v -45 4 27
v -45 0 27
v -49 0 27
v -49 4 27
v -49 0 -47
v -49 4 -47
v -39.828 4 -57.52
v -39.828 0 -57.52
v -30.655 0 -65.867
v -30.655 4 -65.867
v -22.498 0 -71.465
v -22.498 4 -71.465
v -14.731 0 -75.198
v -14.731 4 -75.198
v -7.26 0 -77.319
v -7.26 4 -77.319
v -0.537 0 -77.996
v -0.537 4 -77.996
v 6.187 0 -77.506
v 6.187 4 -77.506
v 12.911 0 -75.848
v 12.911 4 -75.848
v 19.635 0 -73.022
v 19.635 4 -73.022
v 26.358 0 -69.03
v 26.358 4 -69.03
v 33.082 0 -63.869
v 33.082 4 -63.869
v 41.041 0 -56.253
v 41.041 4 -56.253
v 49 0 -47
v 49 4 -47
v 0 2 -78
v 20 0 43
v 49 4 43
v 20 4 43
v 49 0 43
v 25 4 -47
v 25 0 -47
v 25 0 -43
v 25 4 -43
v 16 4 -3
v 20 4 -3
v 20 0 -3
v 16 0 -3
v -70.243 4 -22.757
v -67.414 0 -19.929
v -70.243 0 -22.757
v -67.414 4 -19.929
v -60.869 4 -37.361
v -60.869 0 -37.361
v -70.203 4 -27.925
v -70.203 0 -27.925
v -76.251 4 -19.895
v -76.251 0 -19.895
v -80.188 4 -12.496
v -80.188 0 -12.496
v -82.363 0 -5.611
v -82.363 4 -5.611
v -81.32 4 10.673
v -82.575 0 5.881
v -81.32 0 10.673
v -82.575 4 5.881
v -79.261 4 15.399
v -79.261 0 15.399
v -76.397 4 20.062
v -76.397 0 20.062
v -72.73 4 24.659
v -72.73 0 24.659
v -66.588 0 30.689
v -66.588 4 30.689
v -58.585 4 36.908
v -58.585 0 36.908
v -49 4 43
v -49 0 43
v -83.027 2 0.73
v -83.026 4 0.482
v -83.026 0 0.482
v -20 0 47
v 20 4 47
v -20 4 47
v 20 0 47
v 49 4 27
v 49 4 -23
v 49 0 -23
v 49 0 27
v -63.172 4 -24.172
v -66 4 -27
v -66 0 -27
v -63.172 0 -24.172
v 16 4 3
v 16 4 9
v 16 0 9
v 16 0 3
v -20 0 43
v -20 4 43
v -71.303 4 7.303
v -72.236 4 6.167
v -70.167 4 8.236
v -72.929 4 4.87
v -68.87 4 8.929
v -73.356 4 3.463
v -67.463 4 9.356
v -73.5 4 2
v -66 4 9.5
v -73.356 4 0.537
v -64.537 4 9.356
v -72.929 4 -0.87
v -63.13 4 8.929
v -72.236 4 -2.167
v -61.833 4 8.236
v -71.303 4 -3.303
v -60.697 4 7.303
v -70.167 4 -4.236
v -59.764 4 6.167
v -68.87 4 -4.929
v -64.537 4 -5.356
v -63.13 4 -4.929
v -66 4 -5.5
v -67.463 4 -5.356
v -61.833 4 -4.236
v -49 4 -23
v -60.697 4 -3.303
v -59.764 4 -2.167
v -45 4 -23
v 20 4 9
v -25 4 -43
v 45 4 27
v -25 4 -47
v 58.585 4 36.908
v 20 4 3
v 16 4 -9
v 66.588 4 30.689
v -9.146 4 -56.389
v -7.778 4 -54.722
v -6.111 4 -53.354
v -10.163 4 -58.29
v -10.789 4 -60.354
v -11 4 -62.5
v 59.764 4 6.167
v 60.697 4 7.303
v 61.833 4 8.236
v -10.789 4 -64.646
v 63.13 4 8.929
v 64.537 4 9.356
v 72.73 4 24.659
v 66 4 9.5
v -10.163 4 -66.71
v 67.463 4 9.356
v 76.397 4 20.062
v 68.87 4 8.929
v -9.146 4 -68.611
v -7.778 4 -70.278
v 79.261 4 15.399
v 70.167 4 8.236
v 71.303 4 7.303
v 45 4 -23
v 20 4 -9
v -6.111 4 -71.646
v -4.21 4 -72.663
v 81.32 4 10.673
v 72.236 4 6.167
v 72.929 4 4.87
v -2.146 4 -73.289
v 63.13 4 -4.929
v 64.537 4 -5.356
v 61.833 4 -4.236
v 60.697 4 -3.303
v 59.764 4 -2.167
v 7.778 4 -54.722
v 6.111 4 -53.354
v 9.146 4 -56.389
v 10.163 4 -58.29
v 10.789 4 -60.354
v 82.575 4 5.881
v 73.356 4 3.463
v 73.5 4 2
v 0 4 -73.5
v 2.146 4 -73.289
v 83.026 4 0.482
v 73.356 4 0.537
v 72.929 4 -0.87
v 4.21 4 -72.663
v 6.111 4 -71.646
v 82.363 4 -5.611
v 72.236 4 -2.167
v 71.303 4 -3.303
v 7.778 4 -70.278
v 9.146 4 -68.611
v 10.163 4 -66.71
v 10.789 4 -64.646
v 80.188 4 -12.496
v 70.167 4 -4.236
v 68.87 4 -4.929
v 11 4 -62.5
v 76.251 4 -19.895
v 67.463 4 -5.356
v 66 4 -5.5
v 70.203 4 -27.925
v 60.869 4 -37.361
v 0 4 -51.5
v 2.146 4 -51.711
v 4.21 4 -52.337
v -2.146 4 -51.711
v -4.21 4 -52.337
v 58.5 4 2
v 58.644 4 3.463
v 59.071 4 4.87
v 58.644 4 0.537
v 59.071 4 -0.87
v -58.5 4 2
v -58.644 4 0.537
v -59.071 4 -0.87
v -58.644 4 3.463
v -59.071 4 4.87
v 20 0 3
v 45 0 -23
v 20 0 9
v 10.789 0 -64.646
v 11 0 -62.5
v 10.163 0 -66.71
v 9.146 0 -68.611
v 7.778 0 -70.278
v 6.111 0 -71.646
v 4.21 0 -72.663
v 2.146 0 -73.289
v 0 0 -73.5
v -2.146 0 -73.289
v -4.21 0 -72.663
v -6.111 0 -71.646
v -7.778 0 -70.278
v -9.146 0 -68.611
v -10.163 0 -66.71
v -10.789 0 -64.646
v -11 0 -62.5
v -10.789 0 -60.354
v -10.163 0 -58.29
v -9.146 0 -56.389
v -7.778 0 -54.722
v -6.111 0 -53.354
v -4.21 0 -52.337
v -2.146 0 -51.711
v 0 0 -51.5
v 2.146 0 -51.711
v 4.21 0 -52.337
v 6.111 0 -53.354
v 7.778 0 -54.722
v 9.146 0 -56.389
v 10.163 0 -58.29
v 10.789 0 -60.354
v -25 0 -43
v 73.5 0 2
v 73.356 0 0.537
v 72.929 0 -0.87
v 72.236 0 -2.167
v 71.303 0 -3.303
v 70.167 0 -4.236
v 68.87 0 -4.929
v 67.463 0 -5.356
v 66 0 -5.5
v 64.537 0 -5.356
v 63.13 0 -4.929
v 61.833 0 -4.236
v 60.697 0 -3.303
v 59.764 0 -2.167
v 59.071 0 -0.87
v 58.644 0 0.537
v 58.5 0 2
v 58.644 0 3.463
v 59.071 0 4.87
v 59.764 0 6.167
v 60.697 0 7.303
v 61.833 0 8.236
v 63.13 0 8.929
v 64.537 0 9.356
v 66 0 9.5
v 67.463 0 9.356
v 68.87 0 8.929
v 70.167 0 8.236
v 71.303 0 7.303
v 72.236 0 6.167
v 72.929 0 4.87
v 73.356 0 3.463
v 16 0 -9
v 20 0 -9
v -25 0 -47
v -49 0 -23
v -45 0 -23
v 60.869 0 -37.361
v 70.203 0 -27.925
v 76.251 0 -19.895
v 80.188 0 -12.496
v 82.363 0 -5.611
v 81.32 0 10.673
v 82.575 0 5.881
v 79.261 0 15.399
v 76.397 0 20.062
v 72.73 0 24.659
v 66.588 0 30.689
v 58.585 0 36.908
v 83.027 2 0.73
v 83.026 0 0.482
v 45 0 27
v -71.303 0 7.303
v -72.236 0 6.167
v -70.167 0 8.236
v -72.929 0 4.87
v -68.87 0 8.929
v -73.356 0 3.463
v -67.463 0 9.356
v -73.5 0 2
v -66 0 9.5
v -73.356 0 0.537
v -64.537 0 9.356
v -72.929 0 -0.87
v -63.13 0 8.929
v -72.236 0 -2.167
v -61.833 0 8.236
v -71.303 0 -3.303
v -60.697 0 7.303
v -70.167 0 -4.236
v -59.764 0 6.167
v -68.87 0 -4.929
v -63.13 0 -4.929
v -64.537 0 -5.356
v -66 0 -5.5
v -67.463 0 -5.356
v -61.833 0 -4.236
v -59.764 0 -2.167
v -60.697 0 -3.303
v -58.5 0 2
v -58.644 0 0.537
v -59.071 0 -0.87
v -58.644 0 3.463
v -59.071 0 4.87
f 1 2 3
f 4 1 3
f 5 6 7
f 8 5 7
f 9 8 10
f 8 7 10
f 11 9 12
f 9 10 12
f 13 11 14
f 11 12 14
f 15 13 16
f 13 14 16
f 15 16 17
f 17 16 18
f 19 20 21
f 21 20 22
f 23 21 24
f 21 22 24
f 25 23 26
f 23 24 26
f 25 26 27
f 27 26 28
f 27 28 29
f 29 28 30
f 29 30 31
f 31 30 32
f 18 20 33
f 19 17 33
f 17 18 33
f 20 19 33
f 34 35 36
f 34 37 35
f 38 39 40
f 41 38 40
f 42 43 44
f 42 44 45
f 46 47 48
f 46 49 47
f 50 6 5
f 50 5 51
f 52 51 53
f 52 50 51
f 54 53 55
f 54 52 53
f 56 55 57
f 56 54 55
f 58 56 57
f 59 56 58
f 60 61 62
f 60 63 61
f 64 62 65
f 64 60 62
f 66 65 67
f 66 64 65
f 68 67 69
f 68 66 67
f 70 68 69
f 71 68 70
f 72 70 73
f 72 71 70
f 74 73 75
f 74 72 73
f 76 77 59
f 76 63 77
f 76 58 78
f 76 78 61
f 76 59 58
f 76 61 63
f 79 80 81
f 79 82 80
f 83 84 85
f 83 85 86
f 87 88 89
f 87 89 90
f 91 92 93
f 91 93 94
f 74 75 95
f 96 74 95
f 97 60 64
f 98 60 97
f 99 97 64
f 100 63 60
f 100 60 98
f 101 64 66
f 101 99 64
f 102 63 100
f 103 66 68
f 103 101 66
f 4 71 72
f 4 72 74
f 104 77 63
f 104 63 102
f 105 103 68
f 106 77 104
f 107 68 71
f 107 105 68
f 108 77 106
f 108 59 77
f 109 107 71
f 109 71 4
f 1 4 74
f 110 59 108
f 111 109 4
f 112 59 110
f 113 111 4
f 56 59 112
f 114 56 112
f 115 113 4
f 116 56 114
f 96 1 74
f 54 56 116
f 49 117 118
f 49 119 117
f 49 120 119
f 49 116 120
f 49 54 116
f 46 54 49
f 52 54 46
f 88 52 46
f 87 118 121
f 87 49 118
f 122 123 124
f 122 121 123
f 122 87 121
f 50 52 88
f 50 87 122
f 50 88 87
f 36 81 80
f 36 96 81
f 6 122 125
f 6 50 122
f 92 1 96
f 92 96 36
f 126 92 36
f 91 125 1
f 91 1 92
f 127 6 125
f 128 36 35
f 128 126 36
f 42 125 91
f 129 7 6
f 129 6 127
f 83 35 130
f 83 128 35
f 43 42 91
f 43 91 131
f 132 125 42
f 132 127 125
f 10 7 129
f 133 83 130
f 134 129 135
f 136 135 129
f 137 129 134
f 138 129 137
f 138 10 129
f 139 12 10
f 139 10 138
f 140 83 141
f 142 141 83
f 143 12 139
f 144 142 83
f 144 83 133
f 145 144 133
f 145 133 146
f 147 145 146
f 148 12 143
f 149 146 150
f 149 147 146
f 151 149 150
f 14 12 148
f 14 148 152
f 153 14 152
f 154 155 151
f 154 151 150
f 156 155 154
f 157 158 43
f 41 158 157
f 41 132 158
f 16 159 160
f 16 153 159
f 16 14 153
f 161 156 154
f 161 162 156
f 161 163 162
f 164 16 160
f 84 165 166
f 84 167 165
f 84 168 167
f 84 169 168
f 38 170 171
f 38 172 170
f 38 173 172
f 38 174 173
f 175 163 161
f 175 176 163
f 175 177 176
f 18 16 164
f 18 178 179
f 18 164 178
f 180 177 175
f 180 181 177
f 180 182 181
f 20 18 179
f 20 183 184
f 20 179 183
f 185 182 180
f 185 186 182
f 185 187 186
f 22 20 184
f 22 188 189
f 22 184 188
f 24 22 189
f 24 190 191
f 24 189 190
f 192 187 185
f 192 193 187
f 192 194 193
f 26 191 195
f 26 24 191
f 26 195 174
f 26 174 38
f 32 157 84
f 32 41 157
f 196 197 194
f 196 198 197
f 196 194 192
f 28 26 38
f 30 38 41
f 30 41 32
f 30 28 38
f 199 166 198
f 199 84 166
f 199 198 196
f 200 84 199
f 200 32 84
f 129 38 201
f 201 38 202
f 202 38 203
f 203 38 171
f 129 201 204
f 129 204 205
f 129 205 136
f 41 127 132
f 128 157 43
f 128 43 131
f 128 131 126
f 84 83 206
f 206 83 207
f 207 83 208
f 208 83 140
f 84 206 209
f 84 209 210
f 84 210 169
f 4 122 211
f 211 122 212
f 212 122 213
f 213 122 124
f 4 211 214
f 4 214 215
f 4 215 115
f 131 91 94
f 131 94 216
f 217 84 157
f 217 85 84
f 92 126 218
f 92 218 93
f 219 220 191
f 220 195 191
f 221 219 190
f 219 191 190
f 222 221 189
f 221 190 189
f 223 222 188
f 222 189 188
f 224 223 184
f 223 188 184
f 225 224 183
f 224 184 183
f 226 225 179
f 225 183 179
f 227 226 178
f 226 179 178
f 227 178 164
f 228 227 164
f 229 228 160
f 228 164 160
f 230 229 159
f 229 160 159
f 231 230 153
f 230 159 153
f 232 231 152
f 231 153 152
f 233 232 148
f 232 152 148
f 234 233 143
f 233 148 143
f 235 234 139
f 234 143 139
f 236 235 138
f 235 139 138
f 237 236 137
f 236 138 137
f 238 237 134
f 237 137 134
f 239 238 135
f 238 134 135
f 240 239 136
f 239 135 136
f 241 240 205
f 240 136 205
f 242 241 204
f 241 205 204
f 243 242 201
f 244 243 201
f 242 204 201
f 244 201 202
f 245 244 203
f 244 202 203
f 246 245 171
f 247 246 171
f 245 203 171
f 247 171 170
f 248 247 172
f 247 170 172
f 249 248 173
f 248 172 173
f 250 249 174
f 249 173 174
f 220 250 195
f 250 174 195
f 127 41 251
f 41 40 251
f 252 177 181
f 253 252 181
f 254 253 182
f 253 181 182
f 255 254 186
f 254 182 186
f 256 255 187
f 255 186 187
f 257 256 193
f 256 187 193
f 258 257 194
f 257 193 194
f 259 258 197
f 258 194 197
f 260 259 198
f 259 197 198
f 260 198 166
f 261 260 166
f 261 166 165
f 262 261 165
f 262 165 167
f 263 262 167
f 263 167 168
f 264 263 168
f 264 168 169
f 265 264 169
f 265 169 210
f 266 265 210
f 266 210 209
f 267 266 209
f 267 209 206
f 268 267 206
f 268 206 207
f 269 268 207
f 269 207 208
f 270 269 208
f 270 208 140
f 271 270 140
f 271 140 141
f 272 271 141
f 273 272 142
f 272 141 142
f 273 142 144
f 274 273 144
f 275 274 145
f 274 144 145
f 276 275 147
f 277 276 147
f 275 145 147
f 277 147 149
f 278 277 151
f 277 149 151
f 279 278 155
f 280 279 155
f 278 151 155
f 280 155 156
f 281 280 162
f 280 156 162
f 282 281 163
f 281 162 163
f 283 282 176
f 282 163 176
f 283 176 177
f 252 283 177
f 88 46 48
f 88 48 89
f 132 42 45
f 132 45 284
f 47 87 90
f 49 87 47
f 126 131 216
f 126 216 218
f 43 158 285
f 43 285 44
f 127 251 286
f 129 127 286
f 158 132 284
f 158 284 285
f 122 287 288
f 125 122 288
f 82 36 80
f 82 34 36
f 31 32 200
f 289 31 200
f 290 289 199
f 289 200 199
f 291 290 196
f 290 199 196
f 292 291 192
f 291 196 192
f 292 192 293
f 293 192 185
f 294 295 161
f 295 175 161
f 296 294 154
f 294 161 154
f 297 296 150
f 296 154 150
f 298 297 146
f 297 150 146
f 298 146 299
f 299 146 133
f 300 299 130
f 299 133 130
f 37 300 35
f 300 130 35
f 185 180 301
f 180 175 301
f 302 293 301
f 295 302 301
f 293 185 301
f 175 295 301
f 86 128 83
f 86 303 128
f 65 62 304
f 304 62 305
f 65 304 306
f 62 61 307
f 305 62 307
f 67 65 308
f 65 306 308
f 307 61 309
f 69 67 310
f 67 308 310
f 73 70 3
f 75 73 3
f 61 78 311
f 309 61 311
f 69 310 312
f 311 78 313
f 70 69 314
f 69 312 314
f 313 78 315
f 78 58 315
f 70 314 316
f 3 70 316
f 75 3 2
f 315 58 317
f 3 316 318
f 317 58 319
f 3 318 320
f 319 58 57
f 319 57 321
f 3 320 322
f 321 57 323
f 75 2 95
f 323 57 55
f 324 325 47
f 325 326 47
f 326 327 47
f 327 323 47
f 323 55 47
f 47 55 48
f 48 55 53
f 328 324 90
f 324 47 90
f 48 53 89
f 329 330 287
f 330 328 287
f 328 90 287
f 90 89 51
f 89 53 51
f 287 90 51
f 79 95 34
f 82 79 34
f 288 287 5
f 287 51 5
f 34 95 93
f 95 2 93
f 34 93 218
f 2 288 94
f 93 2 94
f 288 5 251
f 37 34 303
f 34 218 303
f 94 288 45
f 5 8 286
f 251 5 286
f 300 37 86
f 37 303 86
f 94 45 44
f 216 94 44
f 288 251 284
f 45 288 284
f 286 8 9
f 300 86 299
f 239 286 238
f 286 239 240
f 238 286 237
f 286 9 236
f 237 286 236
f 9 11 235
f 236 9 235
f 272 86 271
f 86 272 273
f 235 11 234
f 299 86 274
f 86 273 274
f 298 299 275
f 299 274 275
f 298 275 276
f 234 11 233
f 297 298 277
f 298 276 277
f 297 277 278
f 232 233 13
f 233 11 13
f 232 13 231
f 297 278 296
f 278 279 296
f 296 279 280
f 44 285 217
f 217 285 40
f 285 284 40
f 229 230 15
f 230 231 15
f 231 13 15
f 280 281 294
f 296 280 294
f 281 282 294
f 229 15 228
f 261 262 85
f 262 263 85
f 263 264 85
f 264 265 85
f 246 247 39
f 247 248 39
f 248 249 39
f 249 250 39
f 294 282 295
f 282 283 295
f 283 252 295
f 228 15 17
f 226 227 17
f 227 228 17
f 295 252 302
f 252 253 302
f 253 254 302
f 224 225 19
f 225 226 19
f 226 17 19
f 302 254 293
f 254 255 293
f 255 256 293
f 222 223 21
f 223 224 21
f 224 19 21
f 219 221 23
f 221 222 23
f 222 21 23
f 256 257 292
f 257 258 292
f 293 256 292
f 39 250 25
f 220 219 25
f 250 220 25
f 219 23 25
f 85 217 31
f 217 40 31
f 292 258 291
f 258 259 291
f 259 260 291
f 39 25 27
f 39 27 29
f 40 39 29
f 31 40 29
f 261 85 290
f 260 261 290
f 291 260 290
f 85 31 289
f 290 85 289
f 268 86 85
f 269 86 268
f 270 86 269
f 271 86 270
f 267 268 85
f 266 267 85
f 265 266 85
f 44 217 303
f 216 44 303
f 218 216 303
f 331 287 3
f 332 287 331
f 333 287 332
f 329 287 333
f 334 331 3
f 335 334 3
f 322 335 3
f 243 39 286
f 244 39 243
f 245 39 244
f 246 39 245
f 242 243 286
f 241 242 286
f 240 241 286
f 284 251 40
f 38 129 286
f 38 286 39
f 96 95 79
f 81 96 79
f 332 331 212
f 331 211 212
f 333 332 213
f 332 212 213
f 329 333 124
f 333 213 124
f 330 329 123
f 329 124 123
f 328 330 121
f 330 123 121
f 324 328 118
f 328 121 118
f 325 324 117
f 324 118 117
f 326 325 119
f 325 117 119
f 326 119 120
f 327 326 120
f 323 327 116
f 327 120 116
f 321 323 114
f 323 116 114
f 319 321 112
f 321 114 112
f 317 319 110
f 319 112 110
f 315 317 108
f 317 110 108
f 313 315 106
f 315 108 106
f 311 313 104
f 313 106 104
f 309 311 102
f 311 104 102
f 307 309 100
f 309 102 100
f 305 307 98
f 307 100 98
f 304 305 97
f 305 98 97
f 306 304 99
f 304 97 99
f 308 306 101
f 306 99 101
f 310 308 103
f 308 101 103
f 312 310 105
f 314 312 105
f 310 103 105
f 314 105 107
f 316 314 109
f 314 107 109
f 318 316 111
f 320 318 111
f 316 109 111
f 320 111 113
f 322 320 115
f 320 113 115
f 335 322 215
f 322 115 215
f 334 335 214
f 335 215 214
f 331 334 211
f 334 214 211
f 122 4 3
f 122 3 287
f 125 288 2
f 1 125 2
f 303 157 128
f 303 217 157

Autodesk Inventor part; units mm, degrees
ref_plane "YZ Plane" through (0, 0, 0) normal (1, 0, 0) x (0, 1, 0)
ref_plane "XZ Plane" through (0, 0, 0) normal (0, 1, 0) x (-1, 0, 0)
ref_plane "XY Plane" through (0, 0, 0) normal (0, 0, 1) x (1, 0, 0)
sketch "Sketch2" plane through (0, 0, 0) normal (0, 1, 0) x (-1, 0, 0)
  line L0 (-49, 47) -> (-20, 47) construction
  line L1 (49, 47) -> (49, -47) construction
  line L2 (49, -47) -> (-49, -47)
  line L3 (-49, -47) -> (-49, 47) construction
  line L4 (-49, 47) -> (49, -47) construction
  line L5 (49, 47) -> (-49, -47) construction
  line L6 (49, -23) -> (45, -23)
  line L7 (45, -23) -> (45, 27)
  line L8 (45, 27) -> (49, 27)
  line L9 (49, 27) -> (49, -23)
  line L10 (-49, -23) -> (-45, -23)
  line L11 (-45, -23) -> (-45, 27)
  line L12 (-45, 27) -> (-49, 27)
  line L13 (-49, 27) -> (-49, -23)
  line L14 (25, -47) -> (-25, -47)
  line L15 (-25, -47) -> (-25, -43)
  line L16 (-25, -43) -> (25, -43)
  line L17 (25, -43) -> (25, -47)
  line L18 (0, -47) -> (0, 47)
  line L19 (49, 0) -> (-49, 0)
  line L20 (49, 2) -> (-45, 2) construction
  line L21 (20, 47) -> (0, 47) construction
  line L22 (-20, 47) -> (-20, 51) construction
  line L23 (-20, 51) -> (20, 51) construction
  line L24 (20, 51) -> (20, 47) construction
  line L25 (-20, 47) -> (20, 47)
  line L26 (0, 47) -> (-20, 47) construction
  line L27 (20, 47) -> (49, 47) construction
  line L28 (49, 43) -> (20, 43)
  line L29 (20, 43) -> (20, 47)
  line L30 (-49, 43) -> (-20, 43)
  line L31 (-20, 43) -> (-20, 47)
  line L32 (49, 43) -> (49, 27)
  line L33 (-49, 43) -> (-49, 27)
  line L34 (-49, -23) -> (-49, -47)
  line L35 (49, -23) -> (49, -47)
  point P0 (0, 0)
  point P1 (49, 27)
  point P2 (-49, 27)
  point P3 (0, 0)
  point P4 (0, 0)
  dimension "d7" = 98
  dimension "d8" = 94
  dimension "d5" = 4
  dimension "d6" = 50
  dimension "d3" = 4
  dimension "d4" = 50
  dimension "d1" = 50
  dimension "d2" = 4
  dimension "d0" = 2
  dimension "d27" = 4
  dimension "d28" = 40
  dimension "d31" = 4
extrude "Extrusion1" add sketch "Sketch2" along normal blind 4 contours L2 L17 L16 L18 L19 L7 L6 L35 | L2 L34 L10 L11 L19 L18 L16 L15 | L19 L18 L25 L29 L28 L32 L8 L7 | L19 L11 L12 L33 L30 L31 L25 L18
sketch "Sketch3" plane through (0, 4, 0) normal (0, 1, 0) x (1, 0, 0)
  circle A0 centre (0, 62.5) radius 11
  spline S0 degree 2 poles (-49, 47) (0, 109) (49, 47) knots 0 0 0 1 1 1
  circle A1 centre (66, -2) radius 7.5
  spline S1 degree 2 poles (49, 47) (117.0544, -3.4606) (49, -43) knots 0 0 0 1 1 1
  line L0 (0, 43) -> (0, -53.479) construction
  circle A2 centre (-66, -2) radius 7.5
  spline S2 degree 2 poles (-49, 47) (-117.0544, -3.4606) (-49, -43) knots 0 0 0 1 1 1
  line L1 (-66, 27) -> (-63.1716, 24.1716)
  line L2 (-63.1716, 24.1716) -> (-67.4142, 19.9289)
  line L3 (-67.4142, 19.9289) -> (-70.2426, 22.7574)
  line L4 (-70.2426, 22.7574) -> (-66, 27)
  line L5 (-20, -47) -> (-20, -51)
  line L6 (-20, -51) -> (20, -51)
  line L7 (20, -51) -> (20, -47)
  line L8 (49, 47) -> (25, 47) construction
  line L9 (25, 47) -> (25, 43) projected
  line L10 (25, 43) -> (-25, 43) projected
  line L11 (-25, 43) -> (-25, 47) projected
  line L12 (-25, 47) -> (-49, 47) construction
  line L13 (-49, 47) -> (-49, 23) construction
  line L14 (-49, 23) -> (-45, 23) projected
  line L15 (-45, 23) -> (-45, -27) projected
  line L16 (-45, -27) -> (-49, -27) projected
  line L17 (-49, -27) -> (-49, -43) construction
  line L18 (-49, -43) -> (-20, -43) projected
  line L19 (-20, -43) -> (-20, -47) projected
  line L20 (-20, -47) -> (20, -47) projected
  line L21 (20, -47) -> (20, -43) projected
  line L22 (20, -43) -> (49, -43) projected
  line L23 (49, -43) -> (49, -27) construction
  line L24 (49, -27) -> (45, -27) projected
  line L25 (45, -27) -> (45, 23) projected
  line L26 (45, 23) -> (49, 23) projected
  line L27 (49, 23) -> (49, 47) construction
  line L28 (-25, 43) -> (-25, 47) projected
  line L29 (-25, 47) -> (25, 47)
  line L30 (49, 23) -> (49, -27)
  line L31 (-49, 47) -> (-49, 23) construction
  line L32 (-49, -27) -> (-49, 23)
  line L33 (-45, 23) -> (-45, -27) construction
  line L34 (-45, -2) -> (45, -2) construction
  point P0 (0, 0)
  point P1 (0, 78)
  point P2 (83, -2)
  point P3 (-83, -2)
  point P4 (-49, -2)
  dimension "d12" = 22
  dimension "d14" = 15.5
  dimension "d18" = 15
  dimension "d19" = 17
  dimension "d21" = 6
  dimension "d22" = 4
  dimension "d29" = 20
  dimension "d33" = 15.5
  dimension "d34" = 17
  dimension "d35" = 4
  dimension "d36" = 45
  dimension "d37" = 17
extrude "Extrusion2" add sketch "Sketch3" against normal blind 4 contours S0 S1 L22 L21 L20 L19 L18 S2
sketch "Sketch4" plane through (0, 4, 0) normal (0, 1, 0) x (1, 0, 0)
  line L0 (16, 9) -> (20, 9)
  line L1 (20, 9) -> (20, 3)
  line L2 (20, 3) -> (16, 3)
  line L3 (16, 3) -> (16, 9)
  line L4 (16, -3) -> (20, -3)
  line L5 (20, -3) -> (20, -9)
  line L6 (20, -9) -> (16, -9)
  line L7 (16, -9) -> (16, -3)
  line L8 (-163.8761, 0) -> (163.8761, 0) projected
  line L9 (45, -27) -> (45, 23) projected
  point P0 (0, 0)
  dimension "d42" = 6
  dimension "d43" = 4
  dimension "d44" = 6
  dimension "d45" = 25
extrude "Extrusion3" cut sketch "Sketch4" against normal through all
properties part number "CarBottom_V3" material "Wood (Oak)"
